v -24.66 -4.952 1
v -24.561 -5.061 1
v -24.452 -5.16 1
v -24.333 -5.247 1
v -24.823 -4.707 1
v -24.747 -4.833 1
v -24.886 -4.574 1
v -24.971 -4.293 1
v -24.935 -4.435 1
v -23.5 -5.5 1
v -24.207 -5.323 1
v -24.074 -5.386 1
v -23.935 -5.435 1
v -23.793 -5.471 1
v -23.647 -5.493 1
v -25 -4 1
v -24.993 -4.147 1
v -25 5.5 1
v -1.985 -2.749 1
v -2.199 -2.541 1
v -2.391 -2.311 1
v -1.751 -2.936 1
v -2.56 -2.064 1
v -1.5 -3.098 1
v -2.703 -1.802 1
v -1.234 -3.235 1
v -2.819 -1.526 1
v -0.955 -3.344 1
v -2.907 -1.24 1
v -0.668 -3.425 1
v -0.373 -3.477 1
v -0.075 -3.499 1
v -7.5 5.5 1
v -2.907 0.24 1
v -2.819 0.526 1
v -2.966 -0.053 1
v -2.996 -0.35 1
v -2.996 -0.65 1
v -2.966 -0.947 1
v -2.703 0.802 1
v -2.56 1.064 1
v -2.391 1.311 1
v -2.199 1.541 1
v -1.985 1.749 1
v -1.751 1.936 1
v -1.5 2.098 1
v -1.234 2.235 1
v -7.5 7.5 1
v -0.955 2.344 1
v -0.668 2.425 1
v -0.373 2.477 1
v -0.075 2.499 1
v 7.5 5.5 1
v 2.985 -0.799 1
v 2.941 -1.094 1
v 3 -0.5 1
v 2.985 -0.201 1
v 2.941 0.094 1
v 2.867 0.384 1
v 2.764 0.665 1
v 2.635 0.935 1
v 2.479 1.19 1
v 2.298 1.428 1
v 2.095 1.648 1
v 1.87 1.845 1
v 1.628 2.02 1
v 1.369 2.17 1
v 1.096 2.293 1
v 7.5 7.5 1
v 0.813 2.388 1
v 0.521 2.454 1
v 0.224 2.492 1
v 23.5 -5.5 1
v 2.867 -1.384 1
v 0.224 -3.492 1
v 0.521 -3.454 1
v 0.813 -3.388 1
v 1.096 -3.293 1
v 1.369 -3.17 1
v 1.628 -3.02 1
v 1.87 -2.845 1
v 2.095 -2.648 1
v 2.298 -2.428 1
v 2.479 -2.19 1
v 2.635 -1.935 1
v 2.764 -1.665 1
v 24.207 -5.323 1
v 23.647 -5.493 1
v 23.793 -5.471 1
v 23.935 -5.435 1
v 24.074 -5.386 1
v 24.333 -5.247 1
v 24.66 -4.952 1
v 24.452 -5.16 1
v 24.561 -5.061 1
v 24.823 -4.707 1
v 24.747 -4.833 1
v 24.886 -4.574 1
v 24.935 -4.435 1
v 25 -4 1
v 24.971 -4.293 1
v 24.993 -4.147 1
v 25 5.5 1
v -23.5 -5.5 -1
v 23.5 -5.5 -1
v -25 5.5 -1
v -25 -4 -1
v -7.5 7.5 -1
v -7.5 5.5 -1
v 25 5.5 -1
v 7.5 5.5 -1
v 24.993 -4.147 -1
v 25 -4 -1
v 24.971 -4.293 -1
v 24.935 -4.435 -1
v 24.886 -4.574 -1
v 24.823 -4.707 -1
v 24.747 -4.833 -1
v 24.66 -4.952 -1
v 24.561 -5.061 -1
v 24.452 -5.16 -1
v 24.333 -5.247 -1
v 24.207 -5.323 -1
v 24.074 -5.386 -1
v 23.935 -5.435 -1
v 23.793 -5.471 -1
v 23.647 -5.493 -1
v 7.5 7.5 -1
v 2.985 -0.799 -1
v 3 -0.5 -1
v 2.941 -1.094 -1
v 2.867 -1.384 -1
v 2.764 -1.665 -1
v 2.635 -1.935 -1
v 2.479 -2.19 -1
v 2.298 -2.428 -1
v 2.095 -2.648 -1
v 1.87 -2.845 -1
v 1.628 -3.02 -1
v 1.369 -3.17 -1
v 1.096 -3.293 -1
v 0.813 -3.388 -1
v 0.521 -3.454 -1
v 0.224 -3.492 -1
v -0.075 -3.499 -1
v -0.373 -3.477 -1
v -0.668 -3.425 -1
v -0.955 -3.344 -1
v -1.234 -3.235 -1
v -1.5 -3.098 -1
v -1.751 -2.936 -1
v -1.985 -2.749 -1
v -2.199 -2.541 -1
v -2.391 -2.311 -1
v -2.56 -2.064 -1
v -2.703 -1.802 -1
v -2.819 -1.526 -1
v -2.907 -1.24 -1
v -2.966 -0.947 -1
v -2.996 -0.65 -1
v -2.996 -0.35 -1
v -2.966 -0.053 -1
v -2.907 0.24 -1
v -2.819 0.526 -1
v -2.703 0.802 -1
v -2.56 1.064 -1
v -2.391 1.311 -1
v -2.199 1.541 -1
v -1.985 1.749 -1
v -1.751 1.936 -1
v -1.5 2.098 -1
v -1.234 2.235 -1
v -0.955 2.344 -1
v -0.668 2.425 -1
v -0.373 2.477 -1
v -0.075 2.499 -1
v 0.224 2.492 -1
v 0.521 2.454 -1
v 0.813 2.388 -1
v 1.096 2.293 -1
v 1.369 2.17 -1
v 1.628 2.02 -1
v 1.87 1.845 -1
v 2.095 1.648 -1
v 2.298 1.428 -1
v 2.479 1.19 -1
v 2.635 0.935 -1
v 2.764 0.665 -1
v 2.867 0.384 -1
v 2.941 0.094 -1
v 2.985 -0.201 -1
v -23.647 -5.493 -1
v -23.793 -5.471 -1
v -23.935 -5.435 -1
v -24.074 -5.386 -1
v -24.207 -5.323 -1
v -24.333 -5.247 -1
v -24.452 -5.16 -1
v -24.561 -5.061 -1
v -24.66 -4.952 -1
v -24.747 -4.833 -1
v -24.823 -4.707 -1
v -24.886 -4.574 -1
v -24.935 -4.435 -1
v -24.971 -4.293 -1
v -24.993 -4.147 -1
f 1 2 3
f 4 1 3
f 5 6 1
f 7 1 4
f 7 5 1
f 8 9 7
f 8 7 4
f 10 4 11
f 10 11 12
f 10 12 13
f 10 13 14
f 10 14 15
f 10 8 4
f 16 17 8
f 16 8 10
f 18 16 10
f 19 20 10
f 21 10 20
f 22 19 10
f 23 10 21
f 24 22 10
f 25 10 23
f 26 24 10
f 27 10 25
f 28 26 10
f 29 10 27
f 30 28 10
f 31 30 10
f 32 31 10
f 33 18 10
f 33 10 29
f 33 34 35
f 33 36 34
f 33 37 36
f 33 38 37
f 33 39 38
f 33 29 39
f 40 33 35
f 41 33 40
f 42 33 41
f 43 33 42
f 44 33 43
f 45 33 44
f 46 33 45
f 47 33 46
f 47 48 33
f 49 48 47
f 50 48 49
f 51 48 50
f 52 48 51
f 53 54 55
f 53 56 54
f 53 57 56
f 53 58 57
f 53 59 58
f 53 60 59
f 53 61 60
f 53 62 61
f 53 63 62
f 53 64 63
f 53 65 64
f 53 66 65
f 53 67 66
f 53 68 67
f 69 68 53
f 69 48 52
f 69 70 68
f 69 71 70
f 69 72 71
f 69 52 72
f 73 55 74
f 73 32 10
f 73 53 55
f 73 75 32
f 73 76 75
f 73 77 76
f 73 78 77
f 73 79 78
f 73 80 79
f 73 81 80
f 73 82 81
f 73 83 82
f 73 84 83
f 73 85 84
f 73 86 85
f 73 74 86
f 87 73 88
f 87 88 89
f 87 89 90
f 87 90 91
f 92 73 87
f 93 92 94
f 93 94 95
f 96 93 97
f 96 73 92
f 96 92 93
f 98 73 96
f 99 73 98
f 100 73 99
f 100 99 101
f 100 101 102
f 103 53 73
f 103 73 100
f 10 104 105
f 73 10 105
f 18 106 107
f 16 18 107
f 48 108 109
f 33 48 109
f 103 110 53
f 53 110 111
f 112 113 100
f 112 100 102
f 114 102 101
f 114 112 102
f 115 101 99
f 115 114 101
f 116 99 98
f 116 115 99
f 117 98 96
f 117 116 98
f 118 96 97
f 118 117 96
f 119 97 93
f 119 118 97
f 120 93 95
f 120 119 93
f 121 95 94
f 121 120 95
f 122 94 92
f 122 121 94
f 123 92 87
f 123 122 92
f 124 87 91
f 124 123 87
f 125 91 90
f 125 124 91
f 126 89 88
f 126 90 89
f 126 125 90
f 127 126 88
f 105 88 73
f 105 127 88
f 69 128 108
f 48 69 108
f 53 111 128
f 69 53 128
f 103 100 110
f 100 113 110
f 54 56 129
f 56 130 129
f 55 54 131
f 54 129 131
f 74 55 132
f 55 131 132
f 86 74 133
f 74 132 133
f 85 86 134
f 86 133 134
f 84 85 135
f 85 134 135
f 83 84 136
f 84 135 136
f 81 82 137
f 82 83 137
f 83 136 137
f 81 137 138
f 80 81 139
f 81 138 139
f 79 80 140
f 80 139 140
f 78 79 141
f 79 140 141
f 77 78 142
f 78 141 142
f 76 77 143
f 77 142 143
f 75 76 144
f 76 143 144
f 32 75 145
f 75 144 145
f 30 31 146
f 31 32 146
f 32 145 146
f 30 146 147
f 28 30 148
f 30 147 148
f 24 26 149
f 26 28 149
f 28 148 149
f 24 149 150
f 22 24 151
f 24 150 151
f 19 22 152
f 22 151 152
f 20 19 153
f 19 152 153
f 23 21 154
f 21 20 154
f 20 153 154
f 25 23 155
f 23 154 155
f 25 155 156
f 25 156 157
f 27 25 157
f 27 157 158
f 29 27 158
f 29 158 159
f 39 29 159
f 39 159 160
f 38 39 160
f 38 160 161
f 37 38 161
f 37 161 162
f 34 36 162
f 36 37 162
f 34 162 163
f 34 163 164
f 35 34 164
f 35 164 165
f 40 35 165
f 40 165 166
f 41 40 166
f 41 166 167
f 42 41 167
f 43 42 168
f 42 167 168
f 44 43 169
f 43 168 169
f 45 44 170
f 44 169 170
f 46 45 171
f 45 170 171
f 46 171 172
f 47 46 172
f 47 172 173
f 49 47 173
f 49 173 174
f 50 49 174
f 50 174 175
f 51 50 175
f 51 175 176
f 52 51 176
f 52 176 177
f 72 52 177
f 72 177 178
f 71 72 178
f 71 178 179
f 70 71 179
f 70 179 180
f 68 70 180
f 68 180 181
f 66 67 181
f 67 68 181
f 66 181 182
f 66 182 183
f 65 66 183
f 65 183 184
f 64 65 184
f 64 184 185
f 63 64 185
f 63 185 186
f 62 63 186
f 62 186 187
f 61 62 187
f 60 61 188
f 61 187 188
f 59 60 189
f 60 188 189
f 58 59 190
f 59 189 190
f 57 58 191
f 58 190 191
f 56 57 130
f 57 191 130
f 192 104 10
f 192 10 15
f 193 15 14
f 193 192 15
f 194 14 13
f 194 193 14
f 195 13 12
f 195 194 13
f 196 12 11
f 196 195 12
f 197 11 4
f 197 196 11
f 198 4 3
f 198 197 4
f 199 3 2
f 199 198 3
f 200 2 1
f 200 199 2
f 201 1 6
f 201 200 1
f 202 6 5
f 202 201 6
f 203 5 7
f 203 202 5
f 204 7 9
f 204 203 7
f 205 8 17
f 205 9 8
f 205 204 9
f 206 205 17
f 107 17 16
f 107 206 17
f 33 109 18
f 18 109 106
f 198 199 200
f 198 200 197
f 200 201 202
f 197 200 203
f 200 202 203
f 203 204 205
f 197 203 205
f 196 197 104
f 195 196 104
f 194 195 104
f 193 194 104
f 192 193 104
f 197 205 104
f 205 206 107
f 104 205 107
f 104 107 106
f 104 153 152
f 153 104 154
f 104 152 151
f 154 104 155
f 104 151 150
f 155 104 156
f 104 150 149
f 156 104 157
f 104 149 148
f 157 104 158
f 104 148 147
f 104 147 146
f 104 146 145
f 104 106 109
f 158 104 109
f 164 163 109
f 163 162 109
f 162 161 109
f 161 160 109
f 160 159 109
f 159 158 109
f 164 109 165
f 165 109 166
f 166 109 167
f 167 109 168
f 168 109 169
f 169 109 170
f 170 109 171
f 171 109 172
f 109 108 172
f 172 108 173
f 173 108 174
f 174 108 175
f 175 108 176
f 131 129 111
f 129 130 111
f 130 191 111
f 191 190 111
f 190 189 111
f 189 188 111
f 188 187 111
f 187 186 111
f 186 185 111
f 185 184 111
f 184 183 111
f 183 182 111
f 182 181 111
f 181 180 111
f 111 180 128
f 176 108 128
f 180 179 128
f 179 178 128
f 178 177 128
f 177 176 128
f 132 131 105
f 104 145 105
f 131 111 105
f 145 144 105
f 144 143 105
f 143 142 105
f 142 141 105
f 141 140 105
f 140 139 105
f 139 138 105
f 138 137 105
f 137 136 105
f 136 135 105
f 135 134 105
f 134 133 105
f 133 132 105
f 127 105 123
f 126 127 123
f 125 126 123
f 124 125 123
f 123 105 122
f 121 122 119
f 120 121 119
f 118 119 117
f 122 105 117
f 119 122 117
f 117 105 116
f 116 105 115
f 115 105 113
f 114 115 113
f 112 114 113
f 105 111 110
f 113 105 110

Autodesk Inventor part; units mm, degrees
ref_plane "YZ Plane" through (0, 0, 0) normal (1, 0, 0) x (0, 1, 0)
ref_plane "XZ Plane" through (0, 0, 0) normal (0, 1, 0) x (-1, 0, 0)
ref_plane "XY Plane" through (0, 0, 0) normal (0, 0, 1) x (1, 0, 0)
sketch "草圖1" plane through (0, 0, 0) normal (0, 0, 1) x (1, 0, 0)
  line L0 (0, 0) -> (-25.6572, 0) construction
  line L1 (0, 0) -> (0, 25.6407) construction
  line L2 (-23.5, -5.5) -> (-13.1185, -5.5)
  line L3 (25, -4) -> (25, 5.5)
  line L4 (25, 5.5) -> (-25, 5.5)
  line L5 (-25, 5.5) -> (-25, -4)
  line L6 (-25, -5.5) -> (25, 5.5) construction
  line L7 (25, -5.5) -> (-25, 5.5) construction
  arc A0 (23.5, -5.5) -> (25, -4) centre (23.5, -4) ccw
  arc A1 (-25, -4) -> (-23.5, -5.5) centre (-23.5, -4) ccw
  line L8 (-13.1185, -5.5) -> (23.5, -5.5)
  line L9 (7.5, 5.5) -> (7.5, 7.5)
  line L10 (7.5, 7.5) -> (-7.5, 7.5)
  line L11 (-7.5, 7.5) -> (-7.5, 5.5)
  circle A2 centre (0, -0.5) radius 3
  dimension "d0" = 50
  dimension "d4" = 1.5
  dimension "d13" = 2
  dimension "d14" = 15
  dimension "d15" = 6
  dimension "d16" = 6
  dimension "d17" = 5
extrude "擠出1" add sketch "草圖1" along normal mid plane 2
equation "\"d4\" = d5"
equation "\"折彎半徑\" = 厚度"
equation "\"折彎離隙寬度\" = 厚度"
equation "\"折彎離隙深度\" = 0.5 * 厚度"
equation "\"最小剩餘\" = 2 * 厚度"
equation "\"轉移半徑\" = 折彎半徑"
equation "\"Jacobi半徑大小\" = 折彎半徑"
equation "\"間隙大小\" = 厚度"
equation "\"d5\" = 1.5"
equation "\"厚度\" = 2.5"
properties part number "0 零件" material "不鏽鋼"
